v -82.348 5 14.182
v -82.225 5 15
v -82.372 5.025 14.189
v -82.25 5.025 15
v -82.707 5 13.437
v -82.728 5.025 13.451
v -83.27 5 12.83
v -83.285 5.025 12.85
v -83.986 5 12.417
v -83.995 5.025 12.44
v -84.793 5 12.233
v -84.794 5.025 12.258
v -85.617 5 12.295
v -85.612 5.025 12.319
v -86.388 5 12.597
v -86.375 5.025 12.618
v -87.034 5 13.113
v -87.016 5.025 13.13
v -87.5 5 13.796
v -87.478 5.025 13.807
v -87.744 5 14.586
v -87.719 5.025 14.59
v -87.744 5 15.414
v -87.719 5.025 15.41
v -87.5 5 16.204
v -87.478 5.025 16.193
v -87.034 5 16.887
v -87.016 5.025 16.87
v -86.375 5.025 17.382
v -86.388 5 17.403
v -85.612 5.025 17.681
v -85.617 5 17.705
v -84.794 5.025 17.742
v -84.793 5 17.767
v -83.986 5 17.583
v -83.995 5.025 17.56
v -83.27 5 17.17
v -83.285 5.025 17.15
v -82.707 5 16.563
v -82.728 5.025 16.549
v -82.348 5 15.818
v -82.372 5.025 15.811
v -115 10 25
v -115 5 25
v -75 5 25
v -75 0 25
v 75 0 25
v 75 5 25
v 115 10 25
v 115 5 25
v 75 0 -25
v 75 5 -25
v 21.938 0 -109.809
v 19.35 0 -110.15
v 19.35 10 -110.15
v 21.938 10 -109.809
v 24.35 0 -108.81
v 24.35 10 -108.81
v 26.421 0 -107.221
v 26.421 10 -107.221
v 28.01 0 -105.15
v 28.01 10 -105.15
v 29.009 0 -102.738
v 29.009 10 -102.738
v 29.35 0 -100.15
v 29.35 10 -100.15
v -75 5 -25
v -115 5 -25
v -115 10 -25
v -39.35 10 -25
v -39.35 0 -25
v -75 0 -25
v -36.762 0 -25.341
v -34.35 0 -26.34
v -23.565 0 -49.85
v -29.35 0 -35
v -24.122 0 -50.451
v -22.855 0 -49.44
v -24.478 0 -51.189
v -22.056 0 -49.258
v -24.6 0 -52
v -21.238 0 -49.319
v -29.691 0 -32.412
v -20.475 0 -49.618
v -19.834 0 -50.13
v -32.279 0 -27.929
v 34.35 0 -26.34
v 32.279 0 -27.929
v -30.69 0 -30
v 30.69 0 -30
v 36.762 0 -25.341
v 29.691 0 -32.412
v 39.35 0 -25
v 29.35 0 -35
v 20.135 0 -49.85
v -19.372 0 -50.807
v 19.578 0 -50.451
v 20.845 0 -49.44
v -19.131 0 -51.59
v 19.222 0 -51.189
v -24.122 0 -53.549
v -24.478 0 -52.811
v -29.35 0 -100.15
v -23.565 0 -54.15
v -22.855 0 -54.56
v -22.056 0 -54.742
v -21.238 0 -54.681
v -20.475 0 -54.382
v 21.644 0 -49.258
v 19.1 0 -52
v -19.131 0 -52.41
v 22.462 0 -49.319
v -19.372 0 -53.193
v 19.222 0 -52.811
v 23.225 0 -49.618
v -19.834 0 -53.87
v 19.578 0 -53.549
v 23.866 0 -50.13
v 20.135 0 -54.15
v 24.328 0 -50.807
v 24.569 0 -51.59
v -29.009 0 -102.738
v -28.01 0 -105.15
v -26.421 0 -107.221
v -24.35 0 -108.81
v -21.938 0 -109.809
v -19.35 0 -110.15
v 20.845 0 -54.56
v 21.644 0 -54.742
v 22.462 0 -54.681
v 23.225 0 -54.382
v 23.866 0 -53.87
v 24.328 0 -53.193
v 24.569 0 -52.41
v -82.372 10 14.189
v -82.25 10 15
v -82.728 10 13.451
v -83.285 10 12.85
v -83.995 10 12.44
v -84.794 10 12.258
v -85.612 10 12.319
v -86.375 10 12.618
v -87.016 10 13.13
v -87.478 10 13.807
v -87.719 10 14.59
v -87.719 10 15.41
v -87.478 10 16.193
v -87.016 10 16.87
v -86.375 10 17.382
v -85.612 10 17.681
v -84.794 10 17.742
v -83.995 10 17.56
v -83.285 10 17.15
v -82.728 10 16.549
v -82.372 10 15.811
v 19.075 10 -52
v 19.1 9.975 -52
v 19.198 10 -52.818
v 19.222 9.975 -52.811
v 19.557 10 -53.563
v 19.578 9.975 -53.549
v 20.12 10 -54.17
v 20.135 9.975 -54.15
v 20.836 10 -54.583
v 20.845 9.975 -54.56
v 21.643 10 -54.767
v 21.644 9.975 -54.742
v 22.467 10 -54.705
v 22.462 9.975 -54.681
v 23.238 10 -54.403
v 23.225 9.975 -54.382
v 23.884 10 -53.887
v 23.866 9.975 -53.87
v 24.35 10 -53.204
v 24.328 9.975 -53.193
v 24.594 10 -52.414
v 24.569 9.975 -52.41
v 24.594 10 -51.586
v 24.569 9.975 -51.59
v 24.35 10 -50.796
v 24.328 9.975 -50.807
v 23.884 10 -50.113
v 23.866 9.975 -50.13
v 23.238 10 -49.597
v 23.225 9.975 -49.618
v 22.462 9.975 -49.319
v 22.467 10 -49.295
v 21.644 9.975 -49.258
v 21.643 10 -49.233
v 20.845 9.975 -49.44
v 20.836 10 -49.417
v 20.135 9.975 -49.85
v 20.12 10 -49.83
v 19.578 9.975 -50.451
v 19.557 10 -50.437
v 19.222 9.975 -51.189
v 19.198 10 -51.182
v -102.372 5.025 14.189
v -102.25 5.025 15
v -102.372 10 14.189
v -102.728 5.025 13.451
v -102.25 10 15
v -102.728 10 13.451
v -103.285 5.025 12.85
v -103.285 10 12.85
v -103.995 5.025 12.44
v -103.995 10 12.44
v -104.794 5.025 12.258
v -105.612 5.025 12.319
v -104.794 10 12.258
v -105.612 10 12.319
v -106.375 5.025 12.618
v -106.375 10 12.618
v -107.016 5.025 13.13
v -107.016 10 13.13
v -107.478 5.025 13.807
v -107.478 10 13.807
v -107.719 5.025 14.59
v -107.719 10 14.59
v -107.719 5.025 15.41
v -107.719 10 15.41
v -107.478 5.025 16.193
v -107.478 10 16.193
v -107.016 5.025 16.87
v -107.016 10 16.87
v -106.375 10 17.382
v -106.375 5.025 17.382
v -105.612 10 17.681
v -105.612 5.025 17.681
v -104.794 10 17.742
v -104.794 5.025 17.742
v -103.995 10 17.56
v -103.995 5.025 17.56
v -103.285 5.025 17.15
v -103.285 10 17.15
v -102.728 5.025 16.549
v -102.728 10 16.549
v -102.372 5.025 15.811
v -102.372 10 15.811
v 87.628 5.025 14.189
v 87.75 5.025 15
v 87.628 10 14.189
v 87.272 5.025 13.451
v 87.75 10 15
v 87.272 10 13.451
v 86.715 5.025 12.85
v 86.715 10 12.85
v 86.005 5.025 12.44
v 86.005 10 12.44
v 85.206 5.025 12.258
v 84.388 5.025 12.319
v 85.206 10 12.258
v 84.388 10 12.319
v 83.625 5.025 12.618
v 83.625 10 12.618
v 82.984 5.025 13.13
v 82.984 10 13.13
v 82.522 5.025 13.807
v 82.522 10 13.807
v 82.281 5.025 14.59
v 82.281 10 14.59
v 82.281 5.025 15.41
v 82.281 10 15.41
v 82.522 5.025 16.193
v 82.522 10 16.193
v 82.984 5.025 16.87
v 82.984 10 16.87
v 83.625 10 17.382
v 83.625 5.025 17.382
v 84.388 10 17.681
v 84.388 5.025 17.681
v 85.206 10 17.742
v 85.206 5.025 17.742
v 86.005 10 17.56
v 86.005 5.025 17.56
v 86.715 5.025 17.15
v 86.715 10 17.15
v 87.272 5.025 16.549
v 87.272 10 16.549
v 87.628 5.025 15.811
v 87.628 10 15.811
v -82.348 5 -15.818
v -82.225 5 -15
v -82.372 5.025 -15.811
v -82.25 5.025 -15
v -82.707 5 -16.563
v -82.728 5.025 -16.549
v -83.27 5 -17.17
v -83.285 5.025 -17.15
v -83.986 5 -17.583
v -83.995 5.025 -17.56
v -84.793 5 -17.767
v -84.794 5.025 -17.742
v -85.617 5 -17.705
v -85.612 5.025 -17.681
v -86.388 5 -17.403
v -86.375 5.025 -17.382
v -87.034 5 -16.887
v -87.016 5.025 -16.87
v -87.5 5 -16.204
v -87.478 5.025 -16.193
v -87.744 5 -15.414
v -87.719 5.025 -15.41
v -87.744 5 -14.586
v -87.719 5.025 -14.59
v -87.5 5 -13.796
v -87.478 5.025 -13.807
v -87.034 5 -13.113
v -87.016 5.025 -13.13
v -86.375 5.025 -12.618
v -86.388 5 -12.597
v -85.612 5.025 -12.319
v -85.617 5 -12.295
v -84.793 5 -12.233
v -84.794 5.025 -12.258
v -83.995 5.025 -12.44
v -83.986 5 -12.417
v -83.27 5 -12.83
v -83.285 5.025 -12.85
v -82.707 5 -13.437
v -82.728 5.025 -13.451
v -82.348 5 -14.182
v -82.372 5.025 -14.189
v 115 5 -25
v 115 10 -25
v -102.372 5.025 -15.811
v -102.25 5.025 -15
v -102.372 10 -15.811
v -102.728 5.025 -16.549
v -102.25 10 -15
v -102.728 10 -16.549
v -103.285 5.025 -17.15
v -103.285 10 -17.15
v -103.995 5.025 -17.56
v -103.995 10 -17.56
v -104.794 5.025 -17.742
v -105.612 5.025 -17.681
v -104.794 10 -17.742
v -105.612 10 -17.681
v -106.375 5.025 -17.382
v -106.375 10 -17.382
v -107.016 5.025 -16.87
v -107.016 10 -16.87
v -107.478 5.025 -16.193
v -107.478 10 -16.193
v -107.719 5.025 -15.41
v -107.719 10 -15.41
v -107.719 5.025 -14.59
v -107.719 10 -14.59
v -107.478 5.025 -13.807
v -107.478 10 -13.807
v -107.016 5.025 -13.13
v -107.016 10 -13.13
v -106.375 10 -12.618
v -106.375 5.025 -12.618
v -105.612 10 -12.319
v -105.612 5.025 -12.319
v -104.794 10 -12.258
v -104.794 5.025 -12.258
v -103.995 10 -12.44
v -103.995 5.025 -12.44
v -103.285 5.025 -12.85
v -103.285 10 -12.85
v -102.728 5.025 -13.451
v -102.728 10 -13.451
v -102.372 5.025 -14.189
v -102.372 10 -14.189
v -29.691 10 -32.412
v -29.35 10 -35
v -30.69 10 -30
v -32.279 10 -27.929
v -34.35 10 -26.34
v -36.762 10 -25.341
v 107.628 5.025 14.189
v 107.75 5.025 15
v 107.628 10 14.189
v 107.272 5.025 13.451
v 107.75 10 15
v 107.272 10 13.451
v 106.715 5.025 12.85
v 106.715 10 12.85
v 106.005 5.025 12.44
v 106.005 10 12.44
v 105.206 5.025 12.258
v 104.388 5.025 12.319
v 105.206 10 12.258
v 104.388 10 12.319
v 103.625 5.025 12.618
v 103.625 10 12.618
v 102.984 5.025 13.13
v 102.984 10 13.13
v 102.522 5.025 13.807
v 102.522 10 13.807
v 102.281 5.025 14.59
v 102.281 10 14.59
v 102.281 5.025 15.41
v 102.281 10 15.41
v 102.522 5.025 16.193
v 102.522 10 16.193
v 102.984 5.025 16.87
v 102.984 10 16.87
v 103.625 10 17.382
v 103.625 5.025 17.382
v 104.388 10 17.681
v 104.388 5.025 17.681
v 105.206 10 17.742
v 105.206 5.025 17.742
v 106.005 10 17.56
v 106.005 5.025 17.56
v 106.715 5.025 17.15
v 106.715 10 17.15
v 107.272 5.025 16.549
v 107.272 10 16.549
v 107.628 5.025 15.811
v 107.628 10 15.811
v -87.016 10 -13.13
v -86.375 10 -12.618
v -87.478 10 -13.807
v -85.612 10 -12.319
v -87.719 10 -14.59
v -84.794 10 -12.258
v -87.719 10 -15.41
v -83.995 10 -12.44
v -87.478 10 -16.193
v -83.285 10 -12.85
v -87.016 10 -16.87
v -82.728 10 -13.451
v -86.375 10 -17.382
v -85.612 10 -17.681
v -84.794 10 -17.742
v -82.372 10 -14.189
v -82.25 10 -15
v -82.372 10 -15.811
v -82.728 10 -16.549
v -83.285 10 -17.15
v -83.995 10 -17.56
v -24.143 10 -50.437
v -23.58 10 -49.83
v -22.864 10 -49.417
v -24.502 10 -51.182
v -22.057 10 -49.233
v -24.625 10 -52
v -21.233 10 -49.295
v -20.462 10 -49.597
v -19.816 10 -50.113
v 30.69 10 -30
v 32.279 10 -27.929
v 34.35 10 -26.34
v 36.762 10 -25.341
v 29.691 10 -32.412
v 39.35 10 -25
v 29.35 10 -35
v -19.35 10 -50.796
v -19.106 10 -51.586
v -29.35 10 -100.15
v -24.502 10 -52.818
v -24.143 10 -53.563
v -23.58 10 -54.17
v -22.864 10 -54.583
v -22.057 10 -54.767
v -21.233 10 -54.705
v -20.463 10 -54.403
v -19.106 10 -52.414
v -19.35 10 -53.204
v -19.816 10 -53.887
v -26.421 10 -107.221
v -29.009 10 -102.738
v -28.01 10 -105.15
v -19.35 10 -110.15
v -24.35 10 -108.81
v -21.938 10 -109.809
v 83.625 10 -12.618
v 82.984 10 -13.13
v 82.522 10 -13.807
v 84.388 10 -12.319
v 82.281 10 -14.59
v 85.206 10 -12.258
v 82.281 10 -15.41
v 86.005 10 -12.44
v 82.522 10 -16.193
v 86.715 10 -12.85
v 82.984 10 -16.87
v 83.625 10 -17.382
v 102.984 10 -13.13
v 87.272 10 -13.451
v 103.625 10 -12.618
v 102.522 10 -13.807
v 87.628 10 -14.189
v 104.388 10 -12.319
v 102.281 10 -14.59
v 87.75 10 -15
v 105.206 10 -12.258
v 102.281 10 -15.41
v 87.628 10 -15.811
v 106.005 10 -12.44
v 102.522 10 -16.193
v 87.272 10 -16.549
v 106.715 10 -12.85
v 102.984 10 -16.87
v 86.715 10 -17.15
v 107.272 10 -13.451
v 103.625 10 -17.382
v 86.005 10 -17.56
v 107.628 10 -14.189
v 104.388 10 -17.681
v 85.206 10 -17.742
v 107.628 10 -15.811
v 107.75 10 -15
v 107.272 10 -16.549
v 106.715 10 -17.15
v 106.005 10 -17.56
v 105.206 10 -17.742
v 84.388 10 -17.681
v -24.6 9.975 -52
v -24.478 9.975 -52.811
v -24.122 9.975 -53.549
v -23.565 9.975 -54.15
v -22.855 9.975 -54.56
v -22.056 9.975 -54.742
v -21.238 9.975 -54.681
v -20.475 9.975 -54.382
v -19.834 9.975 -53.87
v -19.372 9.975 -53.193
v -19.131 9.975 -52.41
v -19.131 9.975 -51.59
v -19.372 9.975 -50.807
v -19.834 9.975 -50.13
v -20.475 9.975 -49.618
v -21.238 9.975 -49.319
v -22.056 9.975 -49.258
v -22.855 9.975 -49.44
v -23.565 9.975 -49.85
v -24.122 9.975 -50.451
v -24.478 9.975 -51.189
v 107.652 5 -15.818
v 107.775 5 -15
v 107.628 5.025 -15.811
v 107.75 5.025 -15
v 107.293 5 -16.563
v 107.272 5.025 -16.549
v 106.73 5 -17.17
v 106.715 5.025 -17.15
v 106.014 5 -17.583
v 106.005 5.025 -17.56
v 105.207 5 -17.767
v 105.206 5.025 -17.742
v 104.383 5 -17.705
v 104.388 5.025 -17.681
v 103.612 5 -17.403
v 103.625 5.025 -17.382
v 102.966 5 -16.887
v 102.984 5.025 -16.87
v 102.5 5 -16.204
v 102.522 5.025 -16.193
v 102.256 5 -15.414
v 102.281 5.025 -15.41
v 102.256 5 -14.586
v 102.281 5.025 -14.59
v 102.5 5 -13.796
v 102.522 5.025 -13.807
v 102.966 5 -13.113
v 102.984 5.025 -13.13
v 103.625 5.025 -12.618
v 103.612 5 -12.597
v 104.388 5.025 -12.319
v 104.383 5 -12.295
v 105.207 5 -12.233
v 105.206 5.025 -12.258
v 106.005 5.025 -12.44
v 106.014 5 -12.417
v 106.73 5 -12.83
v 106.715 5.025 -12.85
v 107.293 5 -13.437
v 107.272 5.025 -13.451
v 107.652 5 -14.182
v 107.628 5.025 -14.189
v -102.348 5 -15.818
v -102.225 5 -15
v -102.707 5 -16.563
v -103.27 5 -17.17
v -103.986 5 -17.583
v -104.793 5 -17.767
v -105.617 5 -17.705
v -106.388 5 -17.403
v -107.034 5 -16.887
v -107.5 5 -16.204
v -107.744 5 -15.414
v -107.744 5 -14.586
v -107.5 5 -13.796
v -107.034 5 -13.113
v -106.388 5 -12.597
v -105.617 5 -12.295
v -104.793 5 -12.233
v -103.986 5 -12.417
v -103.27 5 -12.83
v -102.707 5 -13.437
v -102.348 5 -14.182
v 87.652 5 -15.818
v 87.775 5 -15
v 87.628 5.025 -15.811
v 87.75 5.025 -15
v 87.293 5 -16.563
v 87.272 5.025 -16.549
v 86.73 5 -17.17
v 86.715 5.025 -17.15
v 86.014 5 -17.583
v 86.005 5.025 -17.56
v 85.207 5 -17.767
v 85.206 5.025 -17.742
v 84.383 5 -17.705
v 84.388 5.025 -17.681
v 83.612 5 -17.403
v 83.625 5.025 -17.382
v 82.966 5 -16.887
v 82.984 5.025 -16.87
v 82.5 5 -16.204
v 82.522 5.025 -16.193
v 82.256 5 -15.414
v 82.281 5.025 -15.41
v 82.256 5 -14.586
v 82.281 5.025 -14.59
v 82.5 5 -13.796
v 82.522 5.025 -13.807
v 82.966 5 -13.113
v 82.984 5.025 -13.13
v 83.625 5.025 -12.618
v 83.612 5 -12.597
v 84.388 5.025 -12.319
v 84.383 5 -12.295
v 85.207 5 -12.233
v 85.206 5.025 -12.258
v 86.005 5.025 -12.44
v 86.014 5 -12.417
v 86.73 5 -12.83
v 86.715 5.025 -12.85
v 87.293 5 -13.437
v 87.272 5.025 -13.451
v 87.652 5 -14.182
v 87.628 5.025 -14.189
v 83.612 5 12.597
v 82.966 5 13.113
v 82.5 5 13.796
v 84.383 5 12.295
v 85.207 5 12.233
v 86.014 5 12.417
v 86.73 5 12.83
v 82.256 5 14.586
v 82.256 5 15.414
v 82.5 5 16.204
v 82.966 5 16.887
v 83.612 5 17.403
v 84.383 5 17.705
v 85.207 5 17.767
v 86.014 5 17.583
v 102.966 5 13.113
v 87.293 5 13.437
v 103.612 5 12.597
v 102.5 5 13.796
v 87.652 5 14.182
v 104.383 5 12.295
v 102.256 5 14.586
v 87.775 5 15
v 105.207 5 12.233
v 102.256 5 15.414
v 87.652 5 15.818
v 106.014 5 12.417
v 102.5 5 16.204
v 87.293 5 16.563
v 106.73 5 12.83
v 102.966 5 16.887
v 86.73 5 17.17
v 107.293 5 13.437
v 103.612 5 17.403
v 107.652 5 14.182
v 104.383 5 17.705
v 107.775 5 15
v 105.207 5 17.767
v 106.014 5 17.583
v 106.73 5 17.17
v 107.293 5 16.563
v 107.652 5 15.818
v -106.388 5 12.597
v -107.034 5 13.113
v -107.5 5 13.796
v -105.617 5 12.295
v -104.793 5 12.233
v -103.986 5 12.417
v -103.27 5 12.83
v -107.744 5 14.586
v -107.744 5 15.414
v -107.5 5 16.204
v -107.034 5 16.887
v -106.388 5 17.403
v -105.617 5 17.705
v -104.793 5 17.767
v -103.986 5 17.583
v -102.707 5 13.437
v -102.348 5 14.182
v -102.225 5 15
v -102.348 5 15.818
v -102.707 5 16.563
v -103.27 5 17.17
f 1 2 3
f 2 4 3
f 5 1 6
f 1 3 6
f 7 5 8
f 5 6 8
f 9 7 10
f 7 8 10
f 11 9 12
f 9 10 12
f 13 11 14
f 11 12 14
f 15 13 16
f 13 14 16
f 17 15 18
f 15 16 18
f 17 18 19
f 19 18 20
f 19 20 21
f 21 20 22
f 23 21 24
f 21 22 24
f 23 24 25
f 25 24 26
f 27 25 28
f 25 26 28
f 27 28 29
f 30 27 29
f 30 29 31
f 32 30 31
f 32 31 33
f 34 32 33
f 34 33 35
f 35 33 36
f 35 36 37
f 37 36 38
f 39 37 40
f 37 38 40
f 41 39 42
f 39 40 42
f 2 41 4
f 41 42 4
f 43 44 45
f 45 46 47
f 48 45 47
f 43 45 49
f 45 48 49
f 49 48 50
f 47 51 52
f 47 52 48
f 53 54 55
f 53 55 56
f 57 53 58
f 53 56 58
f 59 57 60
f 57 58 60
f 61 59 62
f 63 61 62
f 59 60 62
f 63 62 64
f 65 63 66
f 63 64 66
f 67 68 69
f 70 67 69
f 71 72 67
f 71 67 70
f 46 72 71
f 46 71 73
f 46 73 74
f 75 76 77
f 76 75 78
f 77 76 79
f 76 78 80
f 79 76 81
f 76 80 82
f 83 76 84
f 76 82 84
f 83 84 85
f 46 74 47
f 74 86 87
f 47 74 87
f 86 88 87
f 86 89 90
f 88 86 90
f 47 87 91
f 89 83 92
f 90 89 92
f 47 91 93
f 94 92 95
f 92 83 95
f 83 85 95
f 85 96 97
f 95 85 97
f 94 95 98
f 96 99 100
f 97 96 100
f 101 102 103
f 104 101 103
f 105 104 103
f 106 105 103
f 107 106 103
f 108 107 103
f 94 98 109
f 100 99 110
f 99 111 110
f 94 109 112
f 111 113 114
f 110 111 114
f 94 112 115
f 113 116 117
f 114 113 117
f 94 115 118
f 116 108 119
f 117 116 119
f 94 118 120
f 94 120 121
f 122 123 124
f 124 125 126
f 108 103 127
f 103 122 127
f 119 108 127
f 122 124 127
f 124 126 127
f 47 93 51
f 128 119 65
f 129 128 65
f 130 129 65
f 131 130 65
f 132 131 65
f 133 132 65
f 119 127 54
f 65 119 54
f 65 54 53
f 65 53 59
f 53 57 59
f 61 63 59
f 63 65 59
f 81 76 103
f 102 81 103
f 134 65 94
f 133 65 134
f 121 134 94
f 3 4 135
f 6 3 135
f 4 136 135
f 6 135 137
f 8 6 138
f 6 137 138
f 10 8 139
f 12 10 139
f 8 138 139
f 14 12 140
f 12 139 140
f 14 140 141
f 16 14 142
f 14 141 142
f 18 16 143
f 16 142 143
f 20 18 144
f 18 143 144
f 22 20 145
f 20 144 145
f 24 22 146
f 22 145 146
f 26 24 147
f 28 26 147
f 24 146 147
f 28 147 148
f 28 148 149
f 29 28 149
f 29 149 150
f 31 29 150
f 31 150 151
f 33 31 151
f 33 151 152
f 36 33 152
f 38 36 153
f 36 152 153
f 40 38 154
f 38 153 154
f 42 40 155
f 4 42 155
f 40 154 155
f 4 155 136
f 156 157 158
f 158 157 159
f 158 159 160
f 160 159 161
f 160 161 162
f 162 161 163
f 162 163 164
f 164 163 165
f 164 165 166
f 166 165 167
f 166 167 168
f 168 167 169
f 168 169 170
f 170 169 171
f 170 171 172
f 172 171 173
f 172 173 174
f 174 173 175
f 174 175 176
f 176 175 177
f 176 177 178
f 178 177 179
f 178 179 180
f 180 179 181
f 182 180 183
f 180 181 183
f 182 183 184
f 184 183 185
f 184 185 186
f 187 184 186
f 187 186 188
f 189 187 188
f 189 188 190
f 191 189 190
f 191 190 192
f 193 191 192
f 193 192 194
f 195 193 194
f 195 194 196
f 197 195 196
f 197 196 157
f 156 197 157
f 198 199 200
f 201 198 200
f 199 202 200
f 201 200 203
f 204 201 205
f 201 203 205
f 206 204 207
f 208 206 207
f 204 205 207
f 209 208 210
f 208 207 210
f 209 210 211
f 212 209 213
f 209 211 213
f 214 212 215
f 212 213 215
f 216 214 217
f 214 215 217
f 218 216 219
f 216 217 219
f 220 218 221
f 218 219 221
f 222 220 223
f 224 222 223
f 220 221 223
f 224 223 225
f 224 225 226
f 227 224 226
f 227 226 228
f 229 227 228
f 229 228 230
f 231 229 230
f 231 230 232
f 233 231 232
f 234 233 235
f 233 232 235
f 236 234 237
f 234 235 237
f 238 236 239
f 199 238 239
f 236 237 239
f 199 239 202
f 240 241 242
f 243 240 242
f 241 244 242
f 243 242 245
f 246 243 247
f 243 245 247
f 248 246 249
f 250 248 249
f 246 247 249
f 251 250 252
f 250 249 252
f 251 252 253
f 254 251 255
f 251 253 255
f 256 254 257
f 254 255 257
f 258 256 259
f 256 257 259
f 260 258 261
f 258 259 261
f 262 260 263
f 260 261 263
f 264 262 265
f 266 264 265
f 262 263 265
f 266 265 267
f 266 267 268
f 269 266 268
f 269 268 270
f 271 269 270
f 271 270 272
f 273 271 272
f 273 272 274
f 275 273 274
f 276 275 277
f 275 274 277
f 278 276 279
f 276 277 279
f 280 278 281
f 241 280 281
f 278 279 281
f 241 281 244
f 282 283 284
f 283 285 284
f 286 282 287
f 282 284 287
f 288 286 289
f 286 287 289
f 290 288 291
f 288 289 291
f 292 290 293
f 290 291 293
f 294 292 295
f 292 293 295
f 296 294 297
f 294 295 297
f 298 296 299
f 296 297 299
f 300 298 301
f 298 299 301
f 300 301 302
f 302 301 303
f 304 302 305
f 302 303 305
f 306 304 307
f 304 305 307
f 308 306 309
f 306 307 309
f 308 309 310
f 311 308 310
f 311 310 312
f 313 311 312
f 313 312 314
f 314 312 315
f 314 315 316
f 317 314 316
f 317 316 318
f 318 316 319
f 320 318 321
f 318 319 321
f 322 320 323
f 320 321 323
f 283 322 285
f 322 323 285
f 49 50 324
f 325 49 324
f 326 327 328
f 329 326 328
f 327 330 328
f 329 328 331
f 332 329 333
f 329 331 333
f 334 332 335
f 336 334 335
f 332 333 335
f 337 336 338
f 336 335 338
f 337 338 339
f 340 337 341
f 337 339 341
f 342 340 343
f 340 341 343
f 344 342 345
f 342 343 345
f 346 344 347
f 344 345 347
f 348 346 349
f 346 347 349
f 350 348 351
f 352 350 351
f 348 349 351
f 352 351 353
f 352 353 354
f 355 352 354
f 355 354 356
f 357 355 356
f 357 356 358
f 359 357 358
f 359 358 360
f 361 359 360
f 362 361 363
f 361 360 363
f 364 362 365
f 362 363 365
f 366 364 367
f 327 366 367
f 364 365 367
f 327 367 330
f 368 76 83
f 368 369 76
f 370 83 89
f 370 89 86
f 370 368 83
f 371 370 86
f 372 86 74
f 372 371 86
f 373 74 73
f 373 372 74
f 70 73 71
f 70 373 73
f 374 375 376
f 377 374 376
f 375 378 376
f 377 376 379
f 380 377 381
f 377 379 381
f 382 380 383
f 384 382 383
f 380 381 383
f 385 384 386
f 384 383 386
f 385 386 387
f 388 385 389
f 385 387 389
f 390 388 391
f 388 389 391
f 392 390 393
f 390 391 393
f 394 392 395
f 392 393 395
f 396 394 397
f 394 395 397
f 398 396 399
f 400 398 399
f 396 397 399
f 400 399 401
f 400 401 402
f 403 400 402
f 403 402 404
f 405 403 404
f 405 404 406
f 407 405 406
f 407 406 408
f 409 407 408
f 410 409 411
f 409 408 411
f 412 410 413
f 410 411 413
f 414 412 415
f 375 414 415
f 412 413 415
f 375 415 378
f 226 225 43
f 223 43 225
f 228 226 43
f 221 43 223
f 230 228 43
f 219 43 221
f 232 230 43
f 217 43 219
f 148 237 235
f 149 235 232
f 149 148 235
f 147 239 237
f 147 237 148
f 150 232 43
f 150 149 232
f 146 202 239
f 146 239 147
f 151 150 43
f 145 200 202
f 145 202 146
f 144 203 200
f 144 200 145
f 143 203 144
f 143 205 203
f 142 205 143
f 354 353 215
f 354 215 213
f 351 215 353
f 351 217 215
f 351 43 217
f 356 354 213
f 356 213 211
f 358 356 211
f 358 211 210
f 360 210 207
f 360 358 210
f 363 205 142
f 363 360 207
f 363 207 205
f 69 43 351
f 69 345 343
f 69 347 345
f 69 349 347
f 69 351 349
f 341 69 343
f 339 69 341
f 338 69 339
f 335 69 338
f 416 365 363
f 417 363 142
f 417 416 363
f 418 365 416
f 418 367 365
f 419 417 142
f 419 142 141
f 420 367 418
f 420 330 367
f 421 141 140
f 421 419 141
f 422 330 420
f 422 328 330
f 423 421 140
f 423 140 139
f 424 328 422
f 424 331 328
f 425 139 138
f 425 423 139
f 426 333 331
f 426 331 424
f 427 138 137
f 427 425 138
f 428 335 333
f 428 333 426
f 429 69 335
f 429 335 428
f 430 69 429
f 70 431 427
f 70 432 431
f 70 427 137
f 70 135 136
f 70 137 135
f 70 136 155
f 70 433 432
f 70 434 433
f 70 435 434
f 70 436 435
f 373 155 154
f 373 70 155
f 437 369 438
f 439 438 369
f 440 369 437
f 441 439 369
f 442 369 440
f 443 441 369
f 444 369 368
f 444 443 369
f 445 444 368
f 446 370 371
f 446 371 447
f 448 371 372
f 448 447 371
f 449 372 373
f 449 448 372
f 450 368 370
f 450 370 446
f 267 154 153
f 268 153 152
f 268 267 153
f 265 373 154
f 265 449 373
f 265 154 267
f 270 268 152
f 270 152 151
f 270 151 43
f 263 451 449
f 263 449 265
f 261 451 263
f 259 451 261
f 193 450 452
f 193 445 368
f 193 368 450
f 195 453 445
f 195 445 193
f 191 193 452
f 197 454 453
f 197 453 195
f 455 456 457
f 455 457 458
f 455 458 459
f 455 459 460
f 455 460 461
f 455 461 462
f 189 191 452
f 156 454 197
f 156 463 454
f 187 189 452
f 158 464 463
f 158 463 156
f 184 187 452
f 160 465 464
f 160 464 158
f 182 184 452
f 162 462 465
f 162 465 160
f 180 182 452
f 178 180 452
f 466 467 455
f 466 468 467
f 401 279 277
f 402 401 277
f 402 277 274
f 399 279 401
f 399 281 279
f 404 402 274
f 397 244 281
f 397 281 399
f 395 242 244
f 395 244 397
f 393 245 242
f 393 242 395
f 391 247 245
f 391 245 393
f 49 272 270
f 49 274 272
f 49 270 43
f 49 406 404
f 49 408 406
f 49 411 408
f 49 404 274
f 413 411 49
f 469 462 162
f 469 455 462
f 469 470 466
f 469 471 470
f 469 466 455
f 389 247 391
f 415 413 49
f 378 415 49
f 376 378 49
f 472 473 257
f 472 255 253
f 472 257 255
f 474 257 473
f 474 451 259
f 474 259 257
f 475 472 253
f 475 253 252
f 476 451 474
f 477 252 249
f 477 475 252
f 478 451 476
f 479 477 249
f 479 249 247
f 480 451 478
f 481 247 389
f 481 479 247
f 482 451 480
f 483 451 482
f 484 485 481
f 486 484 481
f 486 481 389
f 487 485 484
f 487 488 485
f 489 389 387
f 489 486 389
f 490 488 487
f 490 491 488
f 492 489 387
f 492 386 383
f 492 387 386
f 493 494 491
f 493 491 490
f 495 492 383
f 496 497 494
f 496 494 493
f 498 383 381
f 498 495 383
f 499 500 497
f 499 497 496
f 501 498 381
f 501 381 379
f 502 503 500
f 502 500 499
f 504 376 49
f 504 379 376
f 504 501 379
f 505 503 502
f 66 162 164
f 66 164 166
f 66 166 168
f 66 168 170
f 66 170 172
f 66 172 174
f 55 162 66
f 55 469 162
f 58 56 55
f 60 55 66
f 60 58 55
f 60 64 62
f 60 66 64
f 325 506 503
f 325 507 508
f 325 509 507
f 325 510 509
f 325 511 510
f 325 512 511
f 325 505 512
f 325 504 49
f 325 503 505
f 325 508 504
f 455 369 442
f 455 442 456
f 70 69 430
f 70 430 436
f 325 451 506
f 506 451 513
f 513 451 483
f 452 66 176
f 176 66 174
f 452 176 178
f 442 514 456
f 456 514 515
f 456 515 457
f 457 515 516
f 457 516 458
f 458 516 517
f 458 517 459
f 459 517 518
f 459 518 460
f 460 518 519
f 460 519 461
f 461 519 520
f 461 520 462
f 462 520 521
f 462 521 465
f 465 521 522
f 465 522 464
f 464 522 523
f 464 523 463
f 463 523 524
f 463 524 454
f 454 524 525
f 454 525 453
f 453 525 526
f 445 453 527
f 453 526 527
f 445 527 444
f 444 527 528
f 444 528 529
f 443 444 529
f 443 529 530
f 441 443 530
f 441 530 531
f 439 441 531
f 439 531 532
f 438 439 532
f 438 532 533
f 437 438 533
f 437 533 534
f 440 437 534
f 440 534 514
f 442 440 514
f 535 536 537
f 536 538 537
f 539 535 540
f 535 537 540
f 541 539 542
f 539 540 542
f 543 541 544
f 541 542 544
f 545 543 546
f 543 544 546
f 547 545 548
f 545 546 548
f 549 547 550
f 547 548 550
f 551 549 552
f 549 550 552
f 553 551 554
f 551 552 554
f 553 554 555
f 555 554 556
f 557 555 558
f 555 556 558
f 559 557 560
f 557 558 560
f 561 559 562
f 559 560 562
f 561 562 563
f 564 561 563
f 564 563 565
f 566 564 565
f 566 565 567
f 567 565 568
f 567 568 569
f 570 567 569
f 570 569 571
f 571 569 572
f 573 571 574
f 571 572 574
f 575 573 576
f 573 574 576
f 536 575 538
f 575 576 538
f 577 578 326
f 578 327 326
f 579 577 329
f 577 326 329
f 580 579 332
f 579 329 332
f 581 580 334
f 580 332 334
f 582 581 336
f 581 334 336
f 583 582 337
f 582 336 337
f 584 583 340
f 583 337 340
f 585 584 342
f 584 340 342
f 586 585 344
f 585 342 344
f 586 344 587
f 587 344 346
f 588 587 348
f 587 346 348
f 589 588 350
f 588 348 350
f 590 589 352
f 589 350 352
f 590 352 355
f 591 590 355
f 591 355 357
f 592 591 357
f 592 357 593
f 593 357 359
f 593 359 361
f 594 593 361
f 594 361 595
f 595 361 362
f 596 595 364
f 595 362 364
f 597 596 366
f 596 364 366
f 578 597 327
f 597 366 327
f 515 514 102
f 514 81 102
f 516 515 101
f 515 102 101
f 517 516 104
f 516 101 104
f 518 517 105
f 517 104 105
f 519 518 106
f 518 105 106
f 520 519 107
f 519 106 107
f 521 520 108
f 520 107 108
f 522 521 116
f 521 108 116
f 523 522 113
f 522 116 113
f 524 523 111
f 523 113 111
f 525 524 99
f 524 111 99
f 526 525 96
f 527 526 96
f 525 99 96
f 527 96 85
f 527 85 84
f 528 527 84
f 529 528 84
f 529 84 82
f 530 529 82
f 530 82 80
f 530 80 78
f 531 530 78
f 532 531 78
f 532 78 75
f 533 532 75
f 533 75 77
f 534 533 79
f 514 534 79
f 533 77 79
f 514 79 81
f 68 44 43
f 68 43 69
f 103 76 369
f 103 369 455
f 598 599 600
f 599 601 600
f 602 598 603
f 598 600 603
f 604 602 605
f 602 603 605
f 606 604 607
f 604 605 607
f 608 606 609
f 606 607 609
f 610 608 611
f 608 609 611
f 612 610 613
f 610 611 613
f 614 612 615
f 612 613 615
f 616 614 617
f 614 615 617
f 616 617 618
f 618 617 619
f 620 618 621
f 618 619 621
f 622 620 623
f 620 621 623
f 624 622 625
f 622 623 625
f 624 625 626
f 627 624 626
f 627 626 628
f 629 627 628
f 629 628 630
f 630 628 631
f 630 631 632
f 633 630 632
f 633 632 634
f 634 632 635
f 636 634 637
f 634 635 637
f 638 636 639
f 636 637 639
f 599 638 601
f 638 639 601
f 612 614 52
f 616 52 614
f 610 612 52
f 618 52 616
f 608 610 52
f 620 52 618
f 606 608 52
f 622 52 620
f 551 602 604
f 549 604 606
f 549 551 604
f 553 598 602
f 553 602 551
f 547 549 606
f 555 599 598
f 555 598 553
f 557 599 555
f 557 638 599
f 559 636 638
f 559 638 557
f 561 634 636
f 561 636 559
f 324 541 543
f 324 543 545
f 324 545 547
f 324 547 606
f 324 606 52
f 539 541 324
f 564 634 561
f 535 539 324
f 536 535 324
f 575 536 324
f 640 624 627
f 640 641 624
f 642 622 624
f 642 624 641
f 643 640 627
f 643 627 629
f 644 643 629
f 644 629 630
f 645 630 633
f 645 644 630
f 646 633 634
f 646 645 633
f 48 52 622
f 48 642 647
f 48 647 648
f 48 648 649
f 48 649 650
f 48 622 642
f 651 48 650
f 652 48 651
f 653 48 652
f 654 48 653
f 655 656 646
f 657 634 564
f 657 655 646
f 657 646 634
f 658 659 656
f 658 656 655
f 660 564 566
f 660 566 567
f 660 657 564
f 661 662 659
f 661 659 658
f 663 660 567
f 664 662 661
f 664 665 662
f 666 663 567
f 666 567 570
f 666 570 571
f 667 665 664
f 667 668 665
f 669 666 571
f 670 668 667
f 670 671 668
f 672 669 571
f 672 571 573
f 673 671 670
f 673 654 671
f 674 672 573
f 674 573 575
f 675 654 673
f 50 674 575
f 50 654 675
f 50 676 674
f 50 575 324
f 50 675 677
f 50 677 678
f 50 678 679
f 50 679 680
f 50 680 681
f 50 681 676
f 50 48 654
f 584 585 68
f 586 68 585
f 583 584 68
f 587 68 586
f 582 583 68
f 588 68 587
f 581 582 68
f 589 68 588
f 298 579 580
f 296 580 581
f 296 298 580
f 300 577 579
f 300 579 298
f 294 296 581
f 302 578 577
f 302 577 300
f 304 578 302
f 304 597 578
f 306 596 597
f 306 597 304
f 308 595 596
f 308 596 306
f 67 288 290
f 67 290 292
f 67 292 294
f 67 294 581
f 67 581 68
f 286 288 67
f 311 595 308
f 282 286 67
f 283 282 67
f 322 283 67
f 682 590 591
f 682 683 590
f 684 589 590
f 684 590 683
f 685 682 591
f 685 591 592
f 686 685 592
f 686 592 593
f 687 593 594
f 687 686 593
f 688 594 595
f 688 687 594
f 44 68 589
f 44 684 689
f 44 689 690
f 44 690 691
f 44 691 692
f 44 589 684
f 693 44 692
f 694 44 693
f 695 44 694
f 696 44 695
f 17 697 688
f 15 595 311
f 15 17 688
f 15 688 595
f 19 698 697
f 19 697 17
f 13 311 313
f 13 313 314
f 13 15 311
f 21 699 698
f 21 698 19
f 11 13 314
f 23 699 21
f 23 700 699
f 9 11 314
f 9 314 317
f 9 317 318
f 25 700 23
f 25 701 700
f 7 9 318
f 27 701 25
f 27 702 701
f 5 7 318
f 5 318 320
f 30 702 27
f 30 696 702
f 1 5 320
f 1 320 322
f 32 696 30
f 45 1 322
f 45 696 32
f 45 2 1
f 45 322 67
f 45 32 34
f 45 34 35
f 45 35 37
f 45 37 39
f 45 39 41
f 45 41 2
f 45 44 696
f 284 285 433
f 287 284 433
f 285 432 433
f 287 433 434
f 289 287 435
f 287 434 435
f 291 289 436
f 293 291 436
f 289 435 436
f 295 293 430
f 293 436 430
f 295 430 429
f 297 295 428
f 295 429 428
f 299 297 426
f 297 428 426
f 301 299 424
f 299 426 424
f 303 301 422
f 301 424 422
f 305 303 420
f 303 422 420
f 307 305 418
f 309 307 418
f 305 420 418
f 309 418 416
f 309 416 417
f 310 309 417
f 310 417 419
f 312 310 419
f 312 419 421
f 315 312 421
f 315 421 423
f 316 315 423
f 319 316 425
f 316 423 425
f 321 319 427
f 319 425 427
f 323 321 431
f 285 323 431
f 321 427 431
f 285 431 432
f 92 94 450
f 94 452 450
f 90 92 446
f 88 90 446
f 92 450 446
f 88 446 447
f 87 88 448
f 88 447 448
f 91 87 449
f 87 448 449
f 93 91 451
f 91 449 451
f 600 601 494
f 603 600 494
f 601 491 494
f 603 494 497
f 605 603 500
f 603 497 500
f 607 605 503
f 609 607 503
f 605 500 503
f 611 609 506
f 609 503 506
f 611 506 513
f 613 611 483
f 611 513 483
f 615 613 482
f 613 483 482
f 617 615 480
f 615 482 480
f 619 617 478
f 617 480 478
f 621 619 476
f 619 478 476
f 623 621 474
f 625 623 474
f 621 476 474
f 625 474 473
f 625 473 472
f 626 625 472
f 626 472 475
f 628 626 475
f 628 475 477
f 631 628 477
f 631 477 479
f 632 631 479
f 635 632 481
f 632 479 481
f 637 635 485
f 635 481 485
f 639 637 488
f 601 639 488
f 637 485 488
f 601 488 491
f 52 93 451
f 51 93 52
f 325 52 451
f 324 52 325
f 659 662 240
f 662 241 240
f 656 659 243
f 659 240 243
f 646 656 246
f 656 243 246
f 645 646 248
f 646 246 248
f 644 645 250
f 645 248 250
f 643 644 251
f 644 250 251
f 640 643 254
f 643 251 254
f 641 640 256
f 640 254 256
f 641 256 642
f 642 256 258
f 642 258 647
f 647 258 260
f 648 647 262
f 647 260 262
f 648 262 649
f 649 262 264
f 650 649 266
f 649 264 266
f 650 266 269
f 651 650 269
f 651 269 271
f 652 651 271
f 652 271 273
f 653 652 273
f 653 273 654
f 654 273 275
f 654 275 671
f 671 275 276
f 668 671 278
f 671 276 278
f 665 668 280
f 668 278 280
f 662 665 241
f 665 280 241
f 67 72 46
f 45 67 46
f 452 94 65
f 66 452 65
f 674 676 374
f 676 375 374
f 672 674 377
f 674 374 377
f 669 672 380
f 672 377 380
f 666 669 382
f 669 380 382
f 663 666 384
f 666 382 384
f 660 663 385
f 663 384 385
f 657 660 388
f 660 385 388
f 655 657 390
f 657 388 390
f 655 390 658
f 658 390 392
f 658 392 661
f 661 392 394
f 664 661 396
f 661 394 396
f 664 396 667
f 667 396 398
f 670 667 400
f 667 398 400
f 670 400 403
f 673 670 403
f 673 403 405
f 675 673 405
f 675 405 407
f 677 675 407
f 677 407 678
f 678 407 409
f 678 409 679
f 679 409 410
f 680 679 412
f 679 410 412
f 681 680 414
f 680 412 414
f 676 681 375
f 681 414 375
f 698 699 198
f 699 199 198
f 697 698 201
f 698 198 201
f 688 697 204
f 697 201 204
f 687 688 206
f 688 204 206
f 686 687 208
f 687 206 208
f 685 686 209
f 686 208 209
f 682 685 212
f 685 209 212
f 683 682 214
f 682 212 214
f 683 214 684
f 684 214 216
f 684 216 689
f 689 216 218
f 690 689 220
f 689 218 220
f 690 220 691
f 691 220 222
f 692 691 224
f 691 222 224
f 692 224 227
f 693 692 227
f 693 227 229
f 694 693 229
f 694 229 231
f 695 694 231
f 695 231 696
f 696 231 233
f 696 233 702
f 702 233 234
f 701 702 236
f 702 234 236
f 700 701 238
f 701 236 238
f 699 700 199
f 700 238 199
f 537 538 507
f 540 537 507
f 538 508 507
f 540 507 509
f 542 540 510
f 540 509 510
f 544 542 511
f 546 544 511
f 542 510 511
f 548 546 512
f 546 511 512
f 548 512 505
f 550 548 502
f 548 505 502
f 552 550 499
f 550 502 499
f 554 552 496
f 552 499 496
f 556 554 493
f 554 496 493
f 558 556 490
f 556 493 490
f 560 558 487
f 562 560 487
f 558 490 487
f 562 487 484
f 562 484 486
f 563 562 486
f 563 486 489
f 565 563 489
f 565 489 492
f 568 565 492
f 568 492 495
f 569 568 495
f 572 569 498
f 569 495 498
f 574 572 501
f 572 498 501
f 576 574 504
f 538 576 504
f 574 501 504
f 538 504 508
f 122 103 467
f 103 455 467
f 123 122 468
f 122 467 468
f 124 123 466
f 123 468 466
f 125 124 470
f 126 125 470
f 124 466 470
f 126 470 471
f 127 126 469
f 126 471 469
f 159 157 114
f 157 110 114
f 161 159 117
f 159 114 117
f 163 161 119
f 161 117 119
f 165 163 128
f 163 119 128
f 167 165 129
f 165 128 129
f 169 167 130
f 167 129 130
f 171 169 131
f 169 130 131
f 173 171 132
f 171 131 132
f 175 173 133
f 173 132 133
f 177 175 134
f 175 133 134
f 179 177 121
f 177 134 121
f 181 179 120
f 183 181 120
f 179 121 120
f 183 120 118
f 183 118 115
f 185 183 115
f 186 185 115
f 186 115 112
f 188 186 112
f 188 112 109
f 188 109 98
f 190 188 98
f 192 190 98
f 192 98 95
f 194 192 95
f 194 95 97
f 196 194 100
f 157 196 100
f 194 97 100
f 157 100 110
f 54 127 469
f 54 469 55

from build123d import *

# Parameters (mm, degrees)
SKETCH1_W                      = 58.7
SKETCH1_H                      = 85.15
SKETCH1_W_2                    = 230
SKETCH1_H_2                    = 50
BOSS_EXTRUDE1_DEPTH            = 10
M5_CLEARANCE_HOLE1_D           = 5.5
M5_CLEARANCE_HOLE1_CSINK_D     = 5.55
M5_CLEARANCE_HOLE1_CSINK_ANGLE = 90
SKETCH5_W                      = 40
SKETCH5_H                      = 50
CUT_EXTRUDE1_DEPTH             = 5
FILLET1_R                      = 10


# Read off the part's stored shape, not the designer's step: M5 Clearance Hole2
with BuildPart() as part:
    # Sketch1 → Boss-Extrude1 (new body)
    with BuildSketch(Plane(origin=(0, 0, 0), x_dir=(1, 0, 0), z_dir=(0, 1, 0))):
        with Locations((0, 67.575)):
            Rectangle(SKETCH1_W, SKETCH1_H)
        Rectangle(SKETCH1_W_2, SKETCH1_H_2)
    extrude(amount=BOSS_EXTRUDE1_DEPTH)

    # M5 Clearance Hole1 (through all)
    with Locations(Plane(origin=(0, 10, 0), x_dir=(1, 0, 0), z_dir=(0, 1, 0))):
        with Locations((-21.85, 52), (21.85, 52)):
            CounterSinkHole(M5_CLEARANCE_HOLE1_D / 2, M5_CLEARANCE_HOLE1_CSINK_D / 2, counter_sink_angle=M5_CLEARANCE_HOLE1_CSINK_ANGLE)

    # Sketch5 → Cut-Extrude1 (cut)
    with BuildSketch(Plane.XZ):
        with Locations((-95, 0)):
            Rectangle(SKETCH5_W, SKETCH5_H)
        with Locations((95, 0)):
            Rectangle(SKETCH5_W, SKETCH5_H)
    extrude(amount=-CUT_EXTRUDE1_DEPTH, mode=Mode.SUBTRACT)

    # M5 Clearance Hole2 outline → M5 Clearance Hole2 (revolve, cut)
    with BuildSketch(Plane(origin=(-85, 0, -15), x_dir=(1, 0, 0), z_dir=(0, 0, 1))):
        Polygon((2.75, 5.025), (2.75, 10), (0, 10), (0, 5), (2.775, 5), align=None)
    revolve(axis=Axis((-85, 0, -15), (0, 1, 0)), mode=Mode.SUBTRACT)

    # M5 Clearance Hole2 2 outline → M5 Clearance Hole2 2 (revolve, cut)
    with BuildSketch(Plane(origin=(-85, 0, 15), x_dir=(1, 0, 0), z_dir=(0, 0, 1))):
        Polygon((2.75, 5.025), (2.75, 10), (0, 10), (0, 5), (2.775, 5), align=None)
    revolve(axis=Axis((-85, 0, 15), (0, 1, 0)), mode=Mode.SUBTRACT)

    # M5 Clearance Hole2 3 outline → M5 Clearance Hole2 3 (revolve, cut)
    with BuildSketch(Plane(origin=(-105, 0, -15), x_dir=(1, 0, 0), z_dir=(0, 0, 1))):
        Polygon((2.75, 5.025), (2.75, 10), (0, 10), (0, 5), (2.775, 5), align=None)
    revolve(axis=Axis((-105, 0, -15), (0, 1, 0)), mode=Mode.SUBTRACT)

    # M5 Clearance Hole2 4 outline → M5 Clearance Hole2 4 (revolve, cut)
    with BuildSketch(Plane(origin=(-105, 0, 15), x_dir=(1, 0, 0), z_dir=(0, 0, 1))):
        Polygon((2.75, 5.025), (2.75, 10), (0, 10), (0, 5), (2.775, 5), align=None)
    revolve(axis=Axis((-105, 0, 15), (0, 1, 0)), mode=Mode.SUBTRACT)

    # M5 Clearance Hole2 5 outline → M5 Clearance Hole2 5 (revolve, cut)
    with BuildSketch(Plane(origin=(105, 0, -15), x_dir=(1, 0, 0), z_dir=(0, 0, 1))):
        Polygon((2.75, 5.025), (2.75, 10), (0, 10), (0, 5), (2.775, 5), align=None)
    revolve(axis=Axis((105, 0, -15), (0, 1, 0)), mode=Mode.SUBTRACT)

    # M5 Clearance Hole2 6 outline → M5 Clearance Hole2 6 (revolve, cut)
    with BuildSketch(Plane(origin=(105, 0, 15), x_dir=(1, 0, 0), z_dir=(0, 0, 1))):
        Polygon((2.75, 5.025), (2.75, 10), (0, 10), (0, 5), (2.775, 5), align=None)
    revolve(axis=Axis((105, 0, 15), (0, 1, 0)), mode=Mode.SUBTRACT)

    # M5 Clearance Hole2 7 outline → M5 Clearance Hole2 7 (revolve, cut)
    with BuildSketch(Plane(origin=(85, 0, -15), x_dir=(1, 0, 0), z_dir=(0, 0, 1))):
        Polygon((2.75, 5.025), (2.75, 10), (0, 10), (0, 5), (2.775, 5), align=None)
    revolve(axis=Axis((85, 0, -15), (0, 1, 0)), mode=Mode.SUBTRACT)

    # M5 Clearance Hole2 8 outline → M5 Clearance Hole2 8 (revolve, cut)
    with BuildSketch(Plane(origin=(85, 0, 15), x_dir=(1, 0, 0), z_dir=(0, 0, 1))):
        Polygon((2.75, 5.025), (2.75, 10), (0, 10), (0, 5), (2.775, 5), align=None)
    revolve(axis=Axis((85, 0, 15), (0, 1, 0)), mode=Mode.SUBTRACT)

    # Fillet1
    fillet1_edges = [part.edges().sort_by_distance(p)[0] for p in [
        (-29.35, 5, -110.15),
        (29.35, 5, -110.15),
        (29.35, 5, -25),
        (-29.35, 5, -25),
    ]]
    fillet(fillet1_edges, radius=FILLET1_R)


solid = part.part
